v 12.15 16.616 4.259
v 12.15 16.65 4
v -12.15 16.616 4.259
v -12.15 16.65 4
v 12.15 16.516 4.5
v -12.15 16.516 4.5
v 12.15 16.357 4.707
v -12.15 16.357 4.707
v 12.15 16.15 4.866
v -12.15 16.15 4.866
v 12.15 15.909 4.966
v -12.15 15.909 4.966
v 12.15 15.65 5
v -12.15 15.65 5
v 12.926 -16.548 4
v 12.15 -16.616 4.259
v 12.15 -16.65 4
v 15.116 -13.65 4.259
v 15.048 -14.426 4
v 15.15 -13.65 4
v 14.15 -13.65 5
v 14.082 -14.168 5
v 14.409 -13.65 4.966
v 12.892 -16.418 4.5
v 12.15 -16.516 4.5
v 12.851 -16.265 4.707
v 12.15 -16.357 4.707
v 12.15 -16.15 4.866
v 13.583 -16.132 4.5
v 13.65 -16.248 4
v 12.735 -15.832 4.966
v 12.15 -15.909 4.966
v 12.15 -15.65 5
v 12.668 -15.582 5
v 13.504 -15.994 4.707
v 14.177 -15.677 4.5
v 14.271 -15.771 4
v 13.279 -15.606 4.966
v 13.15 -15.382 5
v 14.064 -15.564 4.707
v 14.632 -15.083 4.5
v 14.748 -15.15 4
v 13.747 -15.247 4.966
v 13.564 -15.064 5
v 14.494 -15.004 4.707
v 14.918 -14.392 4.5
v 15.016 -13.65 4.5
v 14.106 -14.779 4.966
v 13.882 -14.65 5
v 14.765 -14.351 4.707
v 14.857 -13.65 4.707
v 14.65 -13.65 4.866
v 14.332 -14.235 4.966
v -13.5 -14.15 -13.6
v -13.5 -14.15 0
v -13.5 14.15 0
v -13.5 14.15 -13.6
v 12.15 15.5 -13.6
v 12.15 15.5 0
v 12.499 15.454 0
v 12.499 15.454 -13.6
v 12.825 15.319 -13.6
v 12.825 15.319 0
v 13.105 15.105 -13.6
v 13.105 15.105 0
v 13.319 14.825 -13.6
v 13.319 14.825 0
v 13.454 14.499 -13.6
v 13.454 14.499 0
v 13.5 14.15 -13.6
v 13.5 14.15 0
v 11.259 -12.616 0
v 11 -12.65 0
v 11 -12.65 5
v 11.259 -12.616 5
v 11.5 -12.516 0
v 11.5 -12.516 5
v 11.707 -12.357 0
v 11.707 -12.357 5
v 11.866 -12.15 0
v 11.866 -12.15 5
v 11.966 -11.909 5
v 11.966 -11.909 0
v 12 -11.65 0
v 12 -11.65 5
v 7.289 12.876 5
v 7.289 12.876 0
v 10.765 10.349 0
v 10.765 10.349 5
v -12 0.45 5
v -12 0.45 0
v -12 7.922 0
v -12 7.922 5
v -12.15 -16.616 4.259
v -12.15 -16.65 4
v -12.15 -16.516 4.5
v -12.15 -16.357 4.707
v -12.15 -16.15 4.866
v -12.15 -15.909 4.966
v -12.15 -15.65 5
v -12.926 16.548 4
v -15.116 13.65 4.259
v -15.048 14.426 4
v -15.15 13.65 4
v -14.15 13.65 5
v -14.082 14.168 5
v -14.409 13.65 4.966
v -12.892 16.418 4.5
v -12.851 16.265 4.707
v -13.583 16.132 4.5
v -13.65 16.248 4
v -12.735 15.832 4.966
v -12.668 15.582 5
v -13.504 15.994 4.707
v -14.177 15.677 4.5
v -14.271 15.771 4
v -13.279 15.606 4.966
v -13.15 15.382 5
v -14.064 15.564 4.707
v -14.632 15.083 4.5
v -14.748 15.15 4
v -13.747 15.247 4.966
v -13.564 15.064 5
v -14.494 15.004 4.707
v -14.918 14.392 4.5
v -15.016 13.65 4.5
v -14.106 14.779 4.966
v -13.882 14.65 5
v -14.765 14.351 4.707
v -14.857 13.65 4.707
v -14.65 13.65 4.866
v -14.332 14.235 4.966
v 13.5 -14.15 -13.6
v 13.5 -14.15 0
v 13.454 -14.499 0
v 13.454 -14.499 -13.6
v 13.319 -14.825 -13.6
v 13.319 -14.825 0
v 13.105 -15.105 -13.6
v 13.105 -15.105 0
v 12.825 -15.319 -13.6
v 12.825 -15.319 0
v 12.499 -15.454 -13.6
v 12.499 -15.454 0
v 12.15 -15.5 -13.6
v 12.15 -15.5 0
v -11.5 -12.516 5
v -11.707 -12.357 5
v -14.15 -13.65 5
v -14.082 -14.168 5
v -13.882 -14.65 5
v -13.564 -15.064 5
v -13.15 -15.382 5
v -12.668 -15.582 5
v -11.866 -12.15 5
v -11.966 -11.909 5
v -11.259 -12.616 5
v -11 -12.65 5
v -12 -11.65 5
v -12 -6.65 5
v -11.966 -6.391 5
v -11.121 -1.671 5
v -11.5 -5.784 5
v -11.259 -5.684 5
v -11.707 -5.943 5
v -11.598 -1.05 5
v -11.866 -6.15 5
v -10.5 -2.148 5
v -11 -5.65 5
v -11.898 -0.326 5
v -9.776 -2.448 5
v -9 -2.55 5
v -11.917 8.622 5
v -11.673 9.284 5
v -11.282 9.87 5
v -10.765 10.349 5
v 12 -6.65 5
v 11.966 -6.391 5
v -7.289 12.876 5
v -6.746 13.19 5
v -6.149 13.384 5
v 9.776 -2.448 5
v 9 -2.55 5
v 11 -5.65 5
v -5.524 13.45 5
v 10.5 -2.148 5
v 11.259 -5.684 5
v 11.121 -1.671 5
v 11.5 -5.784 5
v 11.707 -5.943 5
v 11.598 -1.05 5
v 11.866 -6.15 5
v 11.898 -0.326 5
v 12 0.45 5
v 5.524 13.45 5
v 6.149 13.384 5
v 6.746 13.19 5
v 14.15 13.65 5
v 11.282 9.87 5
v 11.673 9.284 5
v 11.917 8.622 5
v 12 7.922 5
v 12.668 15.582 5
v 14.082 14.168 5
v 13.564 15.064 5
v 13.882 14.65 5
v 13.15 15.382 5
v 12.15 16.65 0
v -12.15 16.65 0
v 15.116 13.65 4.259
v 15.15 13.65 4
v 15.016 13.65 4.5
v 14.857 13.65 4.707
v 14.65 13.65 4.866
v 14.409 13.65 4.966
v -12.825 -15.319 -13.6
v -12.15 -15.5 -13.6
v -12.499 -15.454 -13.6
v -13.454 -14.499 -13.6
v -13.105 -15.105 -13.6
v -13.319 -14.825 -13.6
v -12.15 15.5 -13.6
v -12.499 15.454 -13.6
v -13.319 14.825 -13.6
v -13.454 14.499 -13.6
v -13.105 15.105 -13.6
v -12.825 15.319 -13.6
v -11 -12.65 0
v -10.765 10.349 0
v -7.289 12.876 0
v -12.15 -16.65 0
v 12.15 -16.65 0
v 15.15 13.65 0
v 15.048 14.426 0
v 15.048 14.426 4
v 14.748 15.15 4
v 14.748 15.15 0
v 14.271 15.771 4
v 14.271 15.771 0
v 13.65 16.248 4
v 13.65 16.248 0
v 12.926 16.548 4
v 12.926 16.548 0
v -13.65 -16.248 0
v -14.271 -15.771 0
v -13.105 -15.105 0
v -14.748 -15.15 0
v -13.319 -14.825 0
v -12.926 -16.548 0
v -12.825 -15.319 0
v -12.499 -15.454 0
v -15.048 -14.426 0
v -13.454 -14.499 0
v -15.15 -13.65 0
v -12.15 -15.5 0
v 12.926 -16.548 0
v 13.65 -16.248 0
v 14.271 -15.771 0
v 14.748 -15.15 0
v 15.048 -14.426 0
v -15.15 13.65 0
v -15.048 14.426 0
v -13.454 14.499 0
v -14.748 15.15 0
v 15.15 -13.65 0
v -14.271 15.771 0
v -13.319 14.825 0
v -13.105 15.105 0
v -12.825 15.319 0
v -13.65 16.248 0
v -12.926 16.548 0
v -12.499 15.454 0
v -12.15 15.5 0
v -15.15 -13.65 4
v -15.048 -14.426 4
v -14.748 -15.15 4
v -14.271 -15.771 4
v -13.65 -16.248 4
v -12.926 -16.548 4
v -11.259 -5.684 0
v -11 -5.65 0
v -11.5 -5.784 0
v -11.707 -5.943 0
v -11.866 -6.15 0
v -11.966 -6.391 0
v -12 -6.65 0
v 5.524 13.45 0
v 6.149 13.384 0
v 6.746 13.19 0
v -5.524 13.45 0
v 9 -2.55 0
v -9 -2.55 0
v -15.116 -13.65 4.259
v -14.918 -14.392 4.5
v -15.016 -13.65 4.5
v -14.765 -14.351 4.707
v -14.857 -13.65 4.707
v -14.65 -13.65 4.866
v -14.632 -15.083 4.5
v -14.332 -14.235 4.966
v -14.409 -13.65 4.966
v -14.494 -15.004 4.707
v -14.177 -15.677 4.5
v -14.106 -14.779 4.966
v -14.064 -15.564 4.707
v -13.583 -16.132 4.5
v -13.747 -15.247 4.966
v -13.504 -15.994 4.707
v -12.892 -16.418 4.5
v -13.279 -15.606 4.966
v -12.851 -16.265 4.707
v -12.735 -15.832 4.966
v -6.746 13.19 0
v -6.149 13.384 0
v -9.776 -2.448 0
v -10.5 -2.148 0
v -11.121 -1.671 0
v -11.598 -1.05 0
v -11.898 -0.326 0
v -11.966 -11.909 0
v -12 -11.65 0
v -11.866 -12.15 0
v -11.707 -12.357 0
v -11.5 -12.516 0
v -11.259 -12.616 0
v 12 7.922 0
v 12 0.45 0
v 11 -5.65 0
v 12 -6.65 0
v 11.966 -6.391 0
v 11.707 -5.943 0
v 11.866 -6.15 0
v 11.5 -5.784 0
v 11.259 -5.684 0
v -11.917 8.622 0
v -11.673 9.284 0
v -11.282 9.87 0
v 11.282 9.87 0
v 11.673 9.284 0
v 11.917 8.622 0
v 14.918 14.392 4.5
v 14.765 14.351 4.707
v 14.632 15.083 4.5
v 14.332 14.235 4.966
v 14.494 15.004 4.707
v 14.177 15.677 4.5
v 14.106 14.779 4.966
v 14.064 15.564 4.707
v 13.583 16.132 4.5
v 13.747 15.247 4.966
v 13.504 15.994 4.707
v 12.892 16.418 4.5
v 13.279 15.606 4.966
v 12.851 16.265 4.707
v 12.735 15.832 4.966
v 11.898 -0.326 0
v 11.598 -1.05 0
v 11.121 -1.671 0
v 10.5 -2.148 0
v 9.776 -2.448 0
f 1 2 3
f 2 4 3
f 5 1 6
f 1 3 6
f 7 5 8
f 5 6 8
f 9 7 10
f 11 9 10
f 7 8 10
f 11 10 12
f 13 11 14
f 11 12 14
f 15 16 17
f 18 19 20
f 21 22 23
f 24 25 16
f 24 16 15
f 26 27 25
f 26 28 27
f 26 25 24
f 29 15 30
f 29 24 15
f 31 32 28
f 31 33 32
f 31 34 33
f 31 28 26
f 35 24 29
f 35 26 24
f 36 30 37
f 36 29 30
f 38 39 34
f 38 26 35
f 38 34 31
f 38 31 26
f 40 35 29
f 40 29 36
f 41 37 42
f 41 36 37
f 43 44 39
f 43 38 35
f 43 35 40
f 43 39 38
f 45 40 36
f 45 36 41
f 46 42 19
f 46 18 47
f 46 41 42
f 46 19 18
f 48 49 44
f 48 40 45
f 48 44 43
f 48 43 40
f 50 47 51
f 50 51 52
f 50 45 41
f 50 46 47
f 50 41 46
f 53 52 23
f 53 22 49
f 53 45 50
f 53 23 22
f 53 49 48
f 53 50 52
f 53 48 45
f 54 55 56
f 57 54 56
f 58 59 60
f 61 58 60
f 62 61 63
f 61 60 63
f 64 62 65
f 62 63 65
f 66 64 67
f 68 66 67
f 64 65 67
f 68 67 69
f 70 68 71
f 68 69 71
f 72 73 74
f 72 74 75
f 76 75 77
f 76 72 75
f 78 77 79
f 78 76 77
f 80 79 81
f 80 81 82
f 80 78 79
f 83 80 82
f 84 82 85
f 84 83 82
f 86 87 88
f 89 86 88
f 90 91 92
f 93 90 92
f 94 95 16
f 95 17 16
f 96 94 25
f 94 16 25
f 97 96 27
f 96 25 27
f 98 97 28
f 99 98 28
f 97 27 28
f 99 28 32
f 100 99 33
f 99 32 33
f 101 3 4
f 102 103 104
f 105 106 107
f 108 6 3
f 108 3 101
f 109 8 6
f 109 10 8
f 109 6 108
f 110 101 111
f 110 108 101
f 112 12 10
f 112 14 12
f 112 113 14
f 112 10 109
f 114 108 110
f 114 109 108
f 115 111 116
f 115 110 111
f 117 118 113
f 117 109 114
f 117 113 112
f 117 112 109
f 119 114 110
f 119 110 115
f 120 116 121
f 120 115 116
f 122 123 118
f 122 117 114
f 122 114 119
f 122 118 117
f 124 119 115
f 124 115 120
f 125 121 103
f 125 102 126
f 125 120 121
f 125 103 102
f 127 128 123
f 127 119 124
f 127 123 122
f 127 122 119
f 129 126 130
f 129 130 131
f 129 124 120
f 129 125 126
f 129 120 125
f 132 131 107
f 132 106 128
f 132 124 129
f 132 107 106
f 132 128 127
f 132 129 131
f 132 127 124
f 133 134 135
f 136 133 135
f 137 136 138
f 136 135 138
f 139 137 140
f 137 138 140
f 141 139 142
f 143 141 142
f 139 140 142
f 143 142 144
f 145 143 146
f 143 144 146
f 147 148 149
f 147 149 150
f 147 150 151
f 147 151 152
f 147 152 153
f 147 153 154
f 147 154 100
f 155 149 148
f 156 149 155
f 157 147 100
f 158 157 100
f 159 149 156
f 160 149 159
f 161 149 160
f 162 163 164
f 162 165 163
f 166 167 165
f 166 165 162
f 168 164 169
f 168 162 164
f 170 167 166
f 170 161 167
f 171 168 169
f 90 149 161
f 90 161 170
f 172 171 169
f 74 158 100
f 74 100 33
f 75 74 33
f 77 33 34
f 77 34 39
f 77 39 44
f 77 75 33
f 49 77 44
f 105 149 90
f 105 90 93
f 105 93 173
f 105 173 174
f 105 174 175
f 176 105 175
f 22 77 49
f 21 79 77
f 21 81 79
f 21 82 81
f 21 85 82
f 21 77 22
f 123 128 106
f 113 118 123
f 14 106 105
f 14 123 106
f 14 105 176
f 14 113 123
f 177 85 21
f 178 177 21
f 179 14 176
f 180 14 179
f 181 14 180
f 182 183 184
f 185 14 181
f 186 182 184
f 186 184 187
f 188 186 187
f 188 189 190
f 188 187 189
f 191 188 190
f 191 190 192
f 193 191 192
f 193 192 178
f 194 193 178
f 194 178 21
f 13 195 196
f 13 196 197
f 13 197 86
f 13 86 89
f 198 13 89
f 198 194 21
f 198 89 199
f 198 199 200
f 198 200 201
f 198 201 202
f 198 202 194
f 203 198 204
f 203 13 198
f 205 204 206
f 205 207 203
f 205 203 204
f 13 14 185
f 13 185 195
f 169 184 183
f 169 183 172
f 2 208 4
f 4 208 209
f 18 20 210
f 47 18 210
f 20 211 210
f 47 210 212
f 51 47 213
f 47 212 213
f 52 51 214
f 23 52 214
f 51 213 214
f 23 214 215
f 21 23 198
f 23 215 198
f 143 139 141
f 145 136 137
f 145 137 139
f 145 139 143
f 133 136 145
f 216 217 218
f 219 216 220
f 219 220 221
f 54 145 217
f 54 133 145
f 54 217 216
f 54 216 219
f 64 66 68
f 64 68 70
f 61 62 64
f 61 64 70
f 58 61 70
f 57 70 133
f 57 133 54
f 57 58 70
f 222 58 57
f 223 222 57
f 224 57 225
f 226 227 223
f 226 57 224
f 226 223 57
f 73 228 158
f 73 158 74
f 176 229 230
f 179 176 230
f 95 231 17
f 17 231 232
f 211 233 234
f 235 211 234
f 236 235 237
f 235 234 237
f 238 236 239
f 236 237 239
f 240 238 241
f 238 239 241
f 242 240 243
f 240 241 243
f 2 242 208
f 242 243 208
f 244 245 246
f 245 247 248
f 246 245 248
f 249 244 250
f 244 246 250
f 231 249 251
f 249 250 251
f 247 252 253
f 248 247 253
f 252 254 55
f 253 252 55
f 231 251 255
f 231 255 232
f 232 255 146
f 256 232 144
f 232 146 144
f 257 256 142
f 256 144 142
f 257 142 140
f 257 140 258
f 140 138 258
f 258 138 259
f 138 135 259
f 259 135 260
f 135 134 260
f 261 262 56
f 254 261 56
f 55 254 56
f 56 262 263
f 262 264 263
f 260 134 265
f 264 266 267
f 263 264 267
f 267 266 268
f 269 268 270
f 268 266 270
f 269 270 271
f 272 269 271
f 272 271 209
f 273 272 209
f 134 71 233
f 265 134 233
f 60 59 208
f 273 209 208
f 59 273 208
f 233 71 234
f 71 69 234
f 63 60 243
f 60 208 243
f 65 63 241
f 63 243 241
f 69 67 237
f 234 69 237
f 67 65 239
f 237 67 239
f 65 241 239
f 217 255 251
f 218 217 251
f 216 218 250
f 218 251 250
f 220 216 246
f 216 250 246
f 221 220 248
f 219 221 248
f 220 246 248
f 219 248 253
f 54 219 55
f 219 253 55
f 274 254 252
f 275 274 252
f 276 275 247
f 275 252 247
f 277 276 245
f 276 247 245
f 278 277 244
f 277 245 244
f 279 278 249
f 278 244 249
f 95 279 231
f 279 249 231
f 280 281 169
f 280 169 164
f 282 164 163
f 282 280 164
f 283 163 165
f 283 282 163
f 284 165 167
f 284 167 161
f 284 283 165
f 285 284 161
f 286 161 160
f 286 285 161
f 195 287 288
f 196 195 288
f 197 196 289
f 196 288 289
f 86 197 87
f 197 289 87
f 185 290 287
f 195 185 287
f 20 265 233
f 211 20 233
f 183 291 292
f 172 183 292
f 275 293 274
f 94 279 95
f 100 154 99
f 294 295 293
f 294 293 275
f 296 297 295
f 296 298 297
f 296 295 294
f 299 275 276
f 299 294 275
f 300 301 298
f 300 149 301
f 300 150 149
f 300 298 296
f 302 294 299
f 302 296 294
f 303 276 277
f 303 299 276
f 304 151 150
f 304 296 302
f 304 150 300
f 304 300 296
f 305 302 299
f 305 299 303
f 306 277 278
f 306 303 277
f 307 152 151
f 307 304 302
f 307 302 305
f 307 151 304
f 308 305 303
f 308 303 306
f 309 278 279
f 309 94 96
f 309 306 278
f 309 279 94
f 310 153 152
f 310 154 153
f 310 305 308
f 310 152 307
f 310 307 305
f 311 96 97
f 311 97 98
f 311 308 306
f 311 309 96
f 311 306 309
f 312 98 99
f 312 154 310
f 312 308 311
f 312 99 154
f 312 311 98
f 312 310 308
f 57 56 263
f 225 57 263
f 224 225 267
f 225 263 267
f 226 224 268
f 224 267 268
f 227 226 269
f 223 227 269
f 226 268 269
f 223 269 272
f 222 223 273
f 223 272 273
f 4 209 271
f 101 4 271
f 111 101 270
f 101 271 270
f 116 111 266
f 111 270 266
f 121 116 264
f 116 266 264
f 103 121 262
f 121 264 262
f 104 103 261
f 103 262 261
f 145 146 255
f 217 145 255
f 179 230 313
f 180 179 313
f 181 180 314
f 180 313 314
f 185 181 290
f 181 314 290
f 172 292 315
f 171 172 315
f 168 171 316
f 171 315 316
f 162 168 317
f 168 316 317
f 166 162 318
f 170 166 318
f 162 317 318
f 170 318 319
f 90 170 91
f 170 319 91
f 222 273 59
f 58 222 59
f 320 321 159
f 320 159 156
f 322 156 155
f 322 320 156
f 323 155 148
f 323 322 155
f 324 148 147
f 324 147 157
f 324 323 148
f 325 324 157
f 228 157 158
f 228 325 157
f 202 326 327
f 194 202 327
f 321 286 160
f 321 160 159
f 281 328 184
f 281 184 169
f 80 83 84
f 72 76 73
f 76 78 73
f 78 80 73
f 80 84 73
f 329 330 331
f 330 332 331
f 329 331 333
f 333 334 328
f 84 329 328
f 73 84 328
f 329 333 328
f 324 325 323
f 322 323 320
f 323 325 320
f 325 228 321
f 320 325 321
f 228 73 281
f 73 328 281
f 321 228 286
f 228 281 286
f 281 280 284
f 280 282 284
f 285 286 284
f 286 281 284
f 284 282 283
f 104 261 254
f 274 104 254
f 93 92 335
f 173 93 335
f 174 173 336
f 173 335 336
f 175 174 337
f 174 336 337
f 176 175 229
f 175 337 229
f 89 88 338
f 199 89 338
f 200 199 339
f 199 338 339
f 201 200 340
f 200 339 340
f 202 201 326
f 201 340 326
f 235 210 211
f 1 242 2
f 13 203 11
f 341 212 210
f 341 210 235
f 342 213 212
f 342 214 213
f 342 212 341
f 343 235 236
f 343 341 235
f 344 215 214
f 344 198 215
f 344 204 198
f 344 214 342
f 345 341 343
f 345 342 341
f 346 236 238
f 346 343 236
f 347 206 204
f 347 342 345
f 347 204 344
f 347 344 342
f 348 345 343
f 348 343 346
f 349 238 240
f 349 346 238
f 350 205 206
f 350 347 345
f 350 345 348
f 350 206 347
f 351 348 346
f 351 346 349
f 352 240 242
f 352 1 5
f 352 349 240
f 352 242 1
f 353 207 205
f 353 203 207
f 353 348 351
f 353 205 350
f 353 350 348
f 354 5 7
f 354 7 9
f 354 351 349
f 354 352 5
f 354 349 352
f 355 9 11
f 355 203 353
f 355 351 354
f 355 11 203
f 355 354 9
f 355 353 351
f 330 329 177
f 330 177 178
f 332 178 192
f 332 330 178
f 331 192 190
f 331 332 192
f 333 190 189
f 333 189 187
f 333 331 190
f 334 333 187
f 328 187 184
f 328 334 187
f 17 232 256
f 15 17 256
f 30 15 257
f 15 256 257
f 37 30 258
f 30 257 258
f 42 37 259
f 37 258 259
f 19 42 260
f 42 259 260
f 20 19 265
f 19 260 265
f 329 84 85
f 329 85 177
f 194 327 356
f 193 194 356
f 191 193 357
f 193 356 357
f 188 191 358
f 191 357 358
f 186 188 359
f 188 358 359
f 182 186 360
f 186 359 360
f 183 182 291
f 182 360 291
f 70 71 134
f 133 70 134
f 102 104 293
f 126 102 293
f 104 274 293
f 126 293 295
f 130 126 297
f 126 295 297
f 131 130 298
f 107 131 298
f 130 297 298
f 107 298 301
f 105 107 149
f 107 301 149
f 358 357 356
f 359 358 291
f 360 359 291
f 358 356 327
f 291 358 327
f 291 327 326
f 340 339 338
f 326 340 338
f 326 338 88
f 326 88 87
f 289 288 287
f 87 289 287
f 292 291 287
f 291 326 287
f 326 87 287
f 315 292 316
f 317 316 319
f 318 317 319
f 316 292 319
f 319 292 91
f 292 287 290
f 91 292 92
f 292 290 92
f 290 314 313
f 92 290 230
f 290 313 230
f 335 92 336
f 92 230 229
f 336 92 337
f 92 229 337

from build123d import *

# Parameters (mm, degrees)
BOSS_EXTRUDE1_DEPTH = 5
FILLET3_R           = 1
BOSS_EXTRUDE2_DEPTH = 13.6


with BuildPart() as part:
    # Sketch1 → Boss-Extrude1 (new body)
    with BuildSketch(Plane.XY):
        with BuildLine():
            Line((-12.15, -16.65), (12.15, -16.65))
            ThreePointArc((12.15, -16.65), (14.271320344, -15.771320344), (15.15, -13.65))
            Line((15.15, -13.65), (15.15, 13.65))
            ThreePointArc((15.15, 13.65), (14.271320344, 15.771320344), (12.15, 16.65))
            Line((12.15, 16.65), (-12.15, 16.65))
            ThreePointArc((-12.15, 16.65), (-14.271320344, 15.771320344), (-15.15, 13.65))
            Line((-15.15, 13.65), (-15.15, -13.65))
            ThreePointArc((-15.15, -13.65), (-14.271320344, -15.771320344), (-12.15, -16.65))
        make_face()
        with BuildLine():
            Line((-5.524448559, 13.45), (5.524448559, 13.45))
            ThreePointArc((5.524448559, 13.45), (6.452181075, 13.302948016), (7.288963652, 12.876208253))
            Line((7.288963652, 12.876208253), (10.764515093, 10.348534478))
            ThreePointArc((10.764515093, 10.348534478), (11.673344841, 9.28365916), (12, 7.922326225))
            Line((12, 7.922326225), (12, 0.45))
            ThreePointArc((12, 0.45), (11.121320344, -1.671320344), (9, -2.55))
            Line((9, -2.55), (-9, -2.55))
            ThreePointArc((-9, -2.55), (-11.121320344, -1.671320344), (-12, 0.45))
            Line((-12, 0.45), (-12, 7.922326225))
            ThreePointArc((-12, 7.922326225), (-11.673344841, 9.28365916), (-10.764515093, 10.348534478))
            Line((-10.764515093, 10.348534478), (-7.288963652, 12.876208253))
            ThreePointArc((-7.288963652, 12.876208253), (-6.452181075, 13.302948016), (-5.524448559, 13.45))
        make_face(mode=Mode.SUBTRACT)
        with BuildLine():
            Line((-12, -6.65), (-12, -11.65))
            ThreePointArc((-12, -11.65), (-11.707106781, -12.357106781), (-11, -12.65))
            Line((-11, -12.65), (11, -12.65))
            ThreePointArc((11, -12.65), (11.707106781, -12.357106781), (12, -11.65))
            Line((12, -11.65), (12, -6.65))
            ThreePointArc((12, -6.65), (11.707106781, -5.942893219), (11, -5.65))
            Line((11, -5.65), (-11, -5.65))
            ThreePointArc((-11, -5.65), (-11.707106781, -5.942893219), (-12, -6.65))
        make_face(mode=Mode.SUBTRACT)
    extrude(amount=BOSS_EXTRUDE1_DEPTH)

    # Fillet3
    fillet3_edges = [part.edges().sort_by_distance(p)[0] for p in [
        (-14.271320344, 15.771320344, 5),
        (-15.15, 0, 5),
        (-14.271320344, -15.771320344, 5),
        (0, -16.65, 5),
        (14.271320344, -15.771320344, 5),
        (15.15, 0, 5),
        (14.271320344, 15.771320344, 5),
        (0, 16.65, 5),
    ]]
    fillet(fillet3_edges, radius=FILLET3_R)

    # Sketch3 → Boss-Extrude2 (add)
    with BuildSketch(Plane(origin=(0, 0, 0), x_dir=(-1, 0, 0), z_dir=(0, 0, -1))):
        with BuildLine():
            Line((-13.5, 14.15), (-13.5, -14.15))
            ThreePointArc((-13.5, -14.15), (-13.104594155, -15.104594155), (-12.15, -15.5))
            Line((-12.15, -15.5), (12.15, -15.5))
            ThreePointArc((12.15, -15.5), (13.104594155, -15.104594155), (13.5, -14.15))
            Line((13.5, -14.15), (13.5, 14.15))
            ThreePointArc((13.5, 14.15), (13.104594155, 15.104594155), (12.15, 15.5))
            Line((12.15, 15.5), (-12.15, 15.5))
            ThreePointArc((-12.15, 15.5), (-13.104594155, 15.104594155), (-13.5, 14.15))
        make_face()
    extrude(amount=BOSS_EXTRUDE2_DEPTH)


solid = part.part
